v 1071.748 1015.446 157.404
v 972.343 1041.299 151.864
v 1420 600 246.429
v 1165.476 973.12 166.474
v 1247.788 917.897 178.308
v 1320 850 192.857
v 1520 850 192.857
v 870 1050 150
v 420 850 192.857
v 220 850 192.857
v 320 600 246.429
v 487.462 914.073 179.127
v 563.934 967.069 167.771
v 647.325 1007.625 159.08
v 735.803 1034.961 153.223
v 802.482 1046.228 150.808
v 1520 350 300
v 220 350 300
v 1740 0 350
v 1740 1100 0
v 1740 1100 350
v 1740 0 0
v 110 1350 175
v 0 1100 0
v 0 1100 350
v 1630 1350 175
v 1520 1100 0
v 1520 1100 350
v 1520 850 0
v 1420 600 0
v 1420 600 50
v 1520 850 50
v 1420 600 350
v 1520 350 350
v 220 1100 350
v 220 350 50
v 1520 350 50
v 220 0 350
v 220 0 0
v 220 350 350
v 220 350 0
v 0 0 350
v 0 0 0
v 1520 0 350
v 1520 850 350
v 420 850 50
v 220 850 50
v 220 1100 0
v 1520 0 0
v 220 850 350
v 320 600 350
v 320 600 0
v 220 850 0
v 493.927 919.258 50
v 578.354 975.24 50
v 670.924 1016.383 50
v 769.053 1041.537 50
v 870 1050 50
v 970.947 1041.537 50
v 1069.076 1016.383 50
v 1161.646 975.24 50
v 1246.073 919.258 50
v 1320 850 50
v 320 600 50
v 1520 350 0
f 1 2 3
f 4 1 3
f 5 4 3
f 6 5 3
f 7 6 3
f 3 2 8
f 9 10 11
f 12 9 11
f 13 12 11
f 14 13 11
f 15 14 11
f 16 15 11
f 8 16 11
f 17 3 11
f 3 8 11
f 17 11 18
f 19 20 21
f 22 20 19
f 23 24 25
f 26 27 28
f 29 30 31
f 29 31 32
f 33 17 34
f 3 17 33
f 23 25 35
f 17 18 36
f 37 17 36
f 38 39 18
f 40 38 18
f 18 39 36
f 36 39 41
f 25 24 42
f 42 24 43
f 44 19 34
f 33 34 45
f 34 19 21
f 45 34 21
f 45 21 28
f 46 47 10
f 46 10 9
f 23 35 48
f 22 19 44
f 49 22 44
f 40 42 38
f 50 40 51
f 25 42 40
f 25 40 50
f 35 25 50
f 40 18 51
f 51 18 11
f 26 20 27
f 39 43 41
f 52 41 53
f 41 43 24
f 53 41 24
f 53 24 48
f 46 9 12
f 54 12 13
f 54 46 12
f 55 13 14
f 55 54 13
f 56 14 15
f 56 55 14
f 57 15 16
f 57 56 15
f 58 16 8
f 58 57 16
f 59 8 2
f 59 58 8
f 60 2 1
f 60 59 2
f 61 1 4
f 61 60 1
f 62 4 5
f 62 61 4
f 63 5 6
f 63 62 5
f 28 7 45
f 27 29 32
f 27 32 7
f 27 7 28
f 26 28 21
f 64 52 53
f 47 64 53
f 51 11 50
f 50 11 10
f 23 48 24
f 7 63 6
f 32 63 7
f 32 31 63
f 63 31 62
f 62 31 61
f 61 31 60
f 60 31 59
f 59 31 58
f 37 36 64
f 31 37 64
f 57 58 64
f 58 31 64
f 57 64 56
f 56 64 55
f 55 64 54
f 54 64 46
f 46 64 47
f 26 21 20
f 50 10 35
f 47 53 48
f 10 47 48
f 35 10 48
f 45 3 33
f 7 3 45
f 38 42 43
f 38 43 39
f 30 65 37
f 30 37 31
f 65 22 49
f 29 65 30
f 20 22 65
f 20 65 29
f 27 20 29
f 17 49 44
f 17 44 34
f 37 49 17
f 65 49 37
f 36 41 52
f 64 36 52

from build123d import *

# Parameters (mm, degrees)
EXTRUDE1_DEPTH     = 350
EXTRUDE1_2_DEPTH   = 350
EXTRUDE2_START     = -220
EXTRUDE2_DEPTH     = 1300
SKETCH3_W          = 220
SKETCH3_H          = 350
SKETCH4_W          = 220
SKETCH4_H          = 350
CUT_EXTRUDE1_DEPTH = 351.0000001


with BuildPart() as part:
    # Sketch1 → Extrude1 (new body)
    with BuildSketch(Plane.XY):
        Polygon((220, 850), (220, 1100), (0, 1100), (0, 0), (220, 0), (220, 350), (320, 600), align=None)
    extrude(amount=EXTRUDE1_DEPTH)



with BuildPart() as body_2:
    # Sketch1 → Extrude1 2 (new body)
    with BuildSketch(Plane.XY):
        Polygon((1740, 0), (1520, 0), (1520, 350), (1420, 600), (1520, 850), (1520, 1100), (1740, 1100), align=None)
    extrude(amount=EXTRUDE1_2_DEPTH)


with BuildPart() as part_1:
    add(part.part)

    add(body_2.part)  # Extrude2 merges body 2
    # Sketch2 → Extrude2 (add)
    with BuildSketch(Plane.ZY.offset(EXTRUDE2_START)):
        Polygon((50, 1050), (150, 1050), (300, 350), (50, 350), align=None)
    extrude(amount=-EXTRUDE2_DEPTH)

    # Sketch3 → Loft1 section 0
    with BuildSketch(Plane(origin=(0, 1100, 0), x_dir=(-1, 0, 0), z_dir=(0, 1, 0)), mode=Mode.PRIVATE) as loft1_s0:
        with Locations((-110, 175)):
            Rectangle(SKETCH3_W, SKETCH3_H)
    loft([loft1_s0.sketch, Vertex(110, 1350, 175)])

    # Sketch4 → Loft2 section 0
    with BuildSketch(Plane(origin=(0, 1100, 0), x_dir=(-1, 0, 0), z_dir=(0, 1, 0)), mode=Mode.PRIVATE) as loft2_s0:
        with Locations((-1630, 175)):
            Rectangle(SKETCH4_W, SKETCH4_H)
    loft([Vertex(1630, 1350, 175), loft2_s0.sketch])

    # Sketch7 → Cut-Extrude1 (cut, through all)
    with BuildSketch(Plane.XY):
        with BuildLine():
            Line((1520, 850), (1520, 1176.43317984))
            Line((1520, 1176.43317984), (220, 1176.43317984))
            Line((220, 1176.43317984), (220, 850))
            Line((220, 850), (420, 850))
            ThreePointArc((420, 850), (870, 1050), (1320, 850))
            Line((1320, 850), (1520, 850))
        make_face()
    extrude(amount=CUT_EXTRUDE1_DEPTH, mode=Mode.SUBTRACT)


solid = part_1.part
